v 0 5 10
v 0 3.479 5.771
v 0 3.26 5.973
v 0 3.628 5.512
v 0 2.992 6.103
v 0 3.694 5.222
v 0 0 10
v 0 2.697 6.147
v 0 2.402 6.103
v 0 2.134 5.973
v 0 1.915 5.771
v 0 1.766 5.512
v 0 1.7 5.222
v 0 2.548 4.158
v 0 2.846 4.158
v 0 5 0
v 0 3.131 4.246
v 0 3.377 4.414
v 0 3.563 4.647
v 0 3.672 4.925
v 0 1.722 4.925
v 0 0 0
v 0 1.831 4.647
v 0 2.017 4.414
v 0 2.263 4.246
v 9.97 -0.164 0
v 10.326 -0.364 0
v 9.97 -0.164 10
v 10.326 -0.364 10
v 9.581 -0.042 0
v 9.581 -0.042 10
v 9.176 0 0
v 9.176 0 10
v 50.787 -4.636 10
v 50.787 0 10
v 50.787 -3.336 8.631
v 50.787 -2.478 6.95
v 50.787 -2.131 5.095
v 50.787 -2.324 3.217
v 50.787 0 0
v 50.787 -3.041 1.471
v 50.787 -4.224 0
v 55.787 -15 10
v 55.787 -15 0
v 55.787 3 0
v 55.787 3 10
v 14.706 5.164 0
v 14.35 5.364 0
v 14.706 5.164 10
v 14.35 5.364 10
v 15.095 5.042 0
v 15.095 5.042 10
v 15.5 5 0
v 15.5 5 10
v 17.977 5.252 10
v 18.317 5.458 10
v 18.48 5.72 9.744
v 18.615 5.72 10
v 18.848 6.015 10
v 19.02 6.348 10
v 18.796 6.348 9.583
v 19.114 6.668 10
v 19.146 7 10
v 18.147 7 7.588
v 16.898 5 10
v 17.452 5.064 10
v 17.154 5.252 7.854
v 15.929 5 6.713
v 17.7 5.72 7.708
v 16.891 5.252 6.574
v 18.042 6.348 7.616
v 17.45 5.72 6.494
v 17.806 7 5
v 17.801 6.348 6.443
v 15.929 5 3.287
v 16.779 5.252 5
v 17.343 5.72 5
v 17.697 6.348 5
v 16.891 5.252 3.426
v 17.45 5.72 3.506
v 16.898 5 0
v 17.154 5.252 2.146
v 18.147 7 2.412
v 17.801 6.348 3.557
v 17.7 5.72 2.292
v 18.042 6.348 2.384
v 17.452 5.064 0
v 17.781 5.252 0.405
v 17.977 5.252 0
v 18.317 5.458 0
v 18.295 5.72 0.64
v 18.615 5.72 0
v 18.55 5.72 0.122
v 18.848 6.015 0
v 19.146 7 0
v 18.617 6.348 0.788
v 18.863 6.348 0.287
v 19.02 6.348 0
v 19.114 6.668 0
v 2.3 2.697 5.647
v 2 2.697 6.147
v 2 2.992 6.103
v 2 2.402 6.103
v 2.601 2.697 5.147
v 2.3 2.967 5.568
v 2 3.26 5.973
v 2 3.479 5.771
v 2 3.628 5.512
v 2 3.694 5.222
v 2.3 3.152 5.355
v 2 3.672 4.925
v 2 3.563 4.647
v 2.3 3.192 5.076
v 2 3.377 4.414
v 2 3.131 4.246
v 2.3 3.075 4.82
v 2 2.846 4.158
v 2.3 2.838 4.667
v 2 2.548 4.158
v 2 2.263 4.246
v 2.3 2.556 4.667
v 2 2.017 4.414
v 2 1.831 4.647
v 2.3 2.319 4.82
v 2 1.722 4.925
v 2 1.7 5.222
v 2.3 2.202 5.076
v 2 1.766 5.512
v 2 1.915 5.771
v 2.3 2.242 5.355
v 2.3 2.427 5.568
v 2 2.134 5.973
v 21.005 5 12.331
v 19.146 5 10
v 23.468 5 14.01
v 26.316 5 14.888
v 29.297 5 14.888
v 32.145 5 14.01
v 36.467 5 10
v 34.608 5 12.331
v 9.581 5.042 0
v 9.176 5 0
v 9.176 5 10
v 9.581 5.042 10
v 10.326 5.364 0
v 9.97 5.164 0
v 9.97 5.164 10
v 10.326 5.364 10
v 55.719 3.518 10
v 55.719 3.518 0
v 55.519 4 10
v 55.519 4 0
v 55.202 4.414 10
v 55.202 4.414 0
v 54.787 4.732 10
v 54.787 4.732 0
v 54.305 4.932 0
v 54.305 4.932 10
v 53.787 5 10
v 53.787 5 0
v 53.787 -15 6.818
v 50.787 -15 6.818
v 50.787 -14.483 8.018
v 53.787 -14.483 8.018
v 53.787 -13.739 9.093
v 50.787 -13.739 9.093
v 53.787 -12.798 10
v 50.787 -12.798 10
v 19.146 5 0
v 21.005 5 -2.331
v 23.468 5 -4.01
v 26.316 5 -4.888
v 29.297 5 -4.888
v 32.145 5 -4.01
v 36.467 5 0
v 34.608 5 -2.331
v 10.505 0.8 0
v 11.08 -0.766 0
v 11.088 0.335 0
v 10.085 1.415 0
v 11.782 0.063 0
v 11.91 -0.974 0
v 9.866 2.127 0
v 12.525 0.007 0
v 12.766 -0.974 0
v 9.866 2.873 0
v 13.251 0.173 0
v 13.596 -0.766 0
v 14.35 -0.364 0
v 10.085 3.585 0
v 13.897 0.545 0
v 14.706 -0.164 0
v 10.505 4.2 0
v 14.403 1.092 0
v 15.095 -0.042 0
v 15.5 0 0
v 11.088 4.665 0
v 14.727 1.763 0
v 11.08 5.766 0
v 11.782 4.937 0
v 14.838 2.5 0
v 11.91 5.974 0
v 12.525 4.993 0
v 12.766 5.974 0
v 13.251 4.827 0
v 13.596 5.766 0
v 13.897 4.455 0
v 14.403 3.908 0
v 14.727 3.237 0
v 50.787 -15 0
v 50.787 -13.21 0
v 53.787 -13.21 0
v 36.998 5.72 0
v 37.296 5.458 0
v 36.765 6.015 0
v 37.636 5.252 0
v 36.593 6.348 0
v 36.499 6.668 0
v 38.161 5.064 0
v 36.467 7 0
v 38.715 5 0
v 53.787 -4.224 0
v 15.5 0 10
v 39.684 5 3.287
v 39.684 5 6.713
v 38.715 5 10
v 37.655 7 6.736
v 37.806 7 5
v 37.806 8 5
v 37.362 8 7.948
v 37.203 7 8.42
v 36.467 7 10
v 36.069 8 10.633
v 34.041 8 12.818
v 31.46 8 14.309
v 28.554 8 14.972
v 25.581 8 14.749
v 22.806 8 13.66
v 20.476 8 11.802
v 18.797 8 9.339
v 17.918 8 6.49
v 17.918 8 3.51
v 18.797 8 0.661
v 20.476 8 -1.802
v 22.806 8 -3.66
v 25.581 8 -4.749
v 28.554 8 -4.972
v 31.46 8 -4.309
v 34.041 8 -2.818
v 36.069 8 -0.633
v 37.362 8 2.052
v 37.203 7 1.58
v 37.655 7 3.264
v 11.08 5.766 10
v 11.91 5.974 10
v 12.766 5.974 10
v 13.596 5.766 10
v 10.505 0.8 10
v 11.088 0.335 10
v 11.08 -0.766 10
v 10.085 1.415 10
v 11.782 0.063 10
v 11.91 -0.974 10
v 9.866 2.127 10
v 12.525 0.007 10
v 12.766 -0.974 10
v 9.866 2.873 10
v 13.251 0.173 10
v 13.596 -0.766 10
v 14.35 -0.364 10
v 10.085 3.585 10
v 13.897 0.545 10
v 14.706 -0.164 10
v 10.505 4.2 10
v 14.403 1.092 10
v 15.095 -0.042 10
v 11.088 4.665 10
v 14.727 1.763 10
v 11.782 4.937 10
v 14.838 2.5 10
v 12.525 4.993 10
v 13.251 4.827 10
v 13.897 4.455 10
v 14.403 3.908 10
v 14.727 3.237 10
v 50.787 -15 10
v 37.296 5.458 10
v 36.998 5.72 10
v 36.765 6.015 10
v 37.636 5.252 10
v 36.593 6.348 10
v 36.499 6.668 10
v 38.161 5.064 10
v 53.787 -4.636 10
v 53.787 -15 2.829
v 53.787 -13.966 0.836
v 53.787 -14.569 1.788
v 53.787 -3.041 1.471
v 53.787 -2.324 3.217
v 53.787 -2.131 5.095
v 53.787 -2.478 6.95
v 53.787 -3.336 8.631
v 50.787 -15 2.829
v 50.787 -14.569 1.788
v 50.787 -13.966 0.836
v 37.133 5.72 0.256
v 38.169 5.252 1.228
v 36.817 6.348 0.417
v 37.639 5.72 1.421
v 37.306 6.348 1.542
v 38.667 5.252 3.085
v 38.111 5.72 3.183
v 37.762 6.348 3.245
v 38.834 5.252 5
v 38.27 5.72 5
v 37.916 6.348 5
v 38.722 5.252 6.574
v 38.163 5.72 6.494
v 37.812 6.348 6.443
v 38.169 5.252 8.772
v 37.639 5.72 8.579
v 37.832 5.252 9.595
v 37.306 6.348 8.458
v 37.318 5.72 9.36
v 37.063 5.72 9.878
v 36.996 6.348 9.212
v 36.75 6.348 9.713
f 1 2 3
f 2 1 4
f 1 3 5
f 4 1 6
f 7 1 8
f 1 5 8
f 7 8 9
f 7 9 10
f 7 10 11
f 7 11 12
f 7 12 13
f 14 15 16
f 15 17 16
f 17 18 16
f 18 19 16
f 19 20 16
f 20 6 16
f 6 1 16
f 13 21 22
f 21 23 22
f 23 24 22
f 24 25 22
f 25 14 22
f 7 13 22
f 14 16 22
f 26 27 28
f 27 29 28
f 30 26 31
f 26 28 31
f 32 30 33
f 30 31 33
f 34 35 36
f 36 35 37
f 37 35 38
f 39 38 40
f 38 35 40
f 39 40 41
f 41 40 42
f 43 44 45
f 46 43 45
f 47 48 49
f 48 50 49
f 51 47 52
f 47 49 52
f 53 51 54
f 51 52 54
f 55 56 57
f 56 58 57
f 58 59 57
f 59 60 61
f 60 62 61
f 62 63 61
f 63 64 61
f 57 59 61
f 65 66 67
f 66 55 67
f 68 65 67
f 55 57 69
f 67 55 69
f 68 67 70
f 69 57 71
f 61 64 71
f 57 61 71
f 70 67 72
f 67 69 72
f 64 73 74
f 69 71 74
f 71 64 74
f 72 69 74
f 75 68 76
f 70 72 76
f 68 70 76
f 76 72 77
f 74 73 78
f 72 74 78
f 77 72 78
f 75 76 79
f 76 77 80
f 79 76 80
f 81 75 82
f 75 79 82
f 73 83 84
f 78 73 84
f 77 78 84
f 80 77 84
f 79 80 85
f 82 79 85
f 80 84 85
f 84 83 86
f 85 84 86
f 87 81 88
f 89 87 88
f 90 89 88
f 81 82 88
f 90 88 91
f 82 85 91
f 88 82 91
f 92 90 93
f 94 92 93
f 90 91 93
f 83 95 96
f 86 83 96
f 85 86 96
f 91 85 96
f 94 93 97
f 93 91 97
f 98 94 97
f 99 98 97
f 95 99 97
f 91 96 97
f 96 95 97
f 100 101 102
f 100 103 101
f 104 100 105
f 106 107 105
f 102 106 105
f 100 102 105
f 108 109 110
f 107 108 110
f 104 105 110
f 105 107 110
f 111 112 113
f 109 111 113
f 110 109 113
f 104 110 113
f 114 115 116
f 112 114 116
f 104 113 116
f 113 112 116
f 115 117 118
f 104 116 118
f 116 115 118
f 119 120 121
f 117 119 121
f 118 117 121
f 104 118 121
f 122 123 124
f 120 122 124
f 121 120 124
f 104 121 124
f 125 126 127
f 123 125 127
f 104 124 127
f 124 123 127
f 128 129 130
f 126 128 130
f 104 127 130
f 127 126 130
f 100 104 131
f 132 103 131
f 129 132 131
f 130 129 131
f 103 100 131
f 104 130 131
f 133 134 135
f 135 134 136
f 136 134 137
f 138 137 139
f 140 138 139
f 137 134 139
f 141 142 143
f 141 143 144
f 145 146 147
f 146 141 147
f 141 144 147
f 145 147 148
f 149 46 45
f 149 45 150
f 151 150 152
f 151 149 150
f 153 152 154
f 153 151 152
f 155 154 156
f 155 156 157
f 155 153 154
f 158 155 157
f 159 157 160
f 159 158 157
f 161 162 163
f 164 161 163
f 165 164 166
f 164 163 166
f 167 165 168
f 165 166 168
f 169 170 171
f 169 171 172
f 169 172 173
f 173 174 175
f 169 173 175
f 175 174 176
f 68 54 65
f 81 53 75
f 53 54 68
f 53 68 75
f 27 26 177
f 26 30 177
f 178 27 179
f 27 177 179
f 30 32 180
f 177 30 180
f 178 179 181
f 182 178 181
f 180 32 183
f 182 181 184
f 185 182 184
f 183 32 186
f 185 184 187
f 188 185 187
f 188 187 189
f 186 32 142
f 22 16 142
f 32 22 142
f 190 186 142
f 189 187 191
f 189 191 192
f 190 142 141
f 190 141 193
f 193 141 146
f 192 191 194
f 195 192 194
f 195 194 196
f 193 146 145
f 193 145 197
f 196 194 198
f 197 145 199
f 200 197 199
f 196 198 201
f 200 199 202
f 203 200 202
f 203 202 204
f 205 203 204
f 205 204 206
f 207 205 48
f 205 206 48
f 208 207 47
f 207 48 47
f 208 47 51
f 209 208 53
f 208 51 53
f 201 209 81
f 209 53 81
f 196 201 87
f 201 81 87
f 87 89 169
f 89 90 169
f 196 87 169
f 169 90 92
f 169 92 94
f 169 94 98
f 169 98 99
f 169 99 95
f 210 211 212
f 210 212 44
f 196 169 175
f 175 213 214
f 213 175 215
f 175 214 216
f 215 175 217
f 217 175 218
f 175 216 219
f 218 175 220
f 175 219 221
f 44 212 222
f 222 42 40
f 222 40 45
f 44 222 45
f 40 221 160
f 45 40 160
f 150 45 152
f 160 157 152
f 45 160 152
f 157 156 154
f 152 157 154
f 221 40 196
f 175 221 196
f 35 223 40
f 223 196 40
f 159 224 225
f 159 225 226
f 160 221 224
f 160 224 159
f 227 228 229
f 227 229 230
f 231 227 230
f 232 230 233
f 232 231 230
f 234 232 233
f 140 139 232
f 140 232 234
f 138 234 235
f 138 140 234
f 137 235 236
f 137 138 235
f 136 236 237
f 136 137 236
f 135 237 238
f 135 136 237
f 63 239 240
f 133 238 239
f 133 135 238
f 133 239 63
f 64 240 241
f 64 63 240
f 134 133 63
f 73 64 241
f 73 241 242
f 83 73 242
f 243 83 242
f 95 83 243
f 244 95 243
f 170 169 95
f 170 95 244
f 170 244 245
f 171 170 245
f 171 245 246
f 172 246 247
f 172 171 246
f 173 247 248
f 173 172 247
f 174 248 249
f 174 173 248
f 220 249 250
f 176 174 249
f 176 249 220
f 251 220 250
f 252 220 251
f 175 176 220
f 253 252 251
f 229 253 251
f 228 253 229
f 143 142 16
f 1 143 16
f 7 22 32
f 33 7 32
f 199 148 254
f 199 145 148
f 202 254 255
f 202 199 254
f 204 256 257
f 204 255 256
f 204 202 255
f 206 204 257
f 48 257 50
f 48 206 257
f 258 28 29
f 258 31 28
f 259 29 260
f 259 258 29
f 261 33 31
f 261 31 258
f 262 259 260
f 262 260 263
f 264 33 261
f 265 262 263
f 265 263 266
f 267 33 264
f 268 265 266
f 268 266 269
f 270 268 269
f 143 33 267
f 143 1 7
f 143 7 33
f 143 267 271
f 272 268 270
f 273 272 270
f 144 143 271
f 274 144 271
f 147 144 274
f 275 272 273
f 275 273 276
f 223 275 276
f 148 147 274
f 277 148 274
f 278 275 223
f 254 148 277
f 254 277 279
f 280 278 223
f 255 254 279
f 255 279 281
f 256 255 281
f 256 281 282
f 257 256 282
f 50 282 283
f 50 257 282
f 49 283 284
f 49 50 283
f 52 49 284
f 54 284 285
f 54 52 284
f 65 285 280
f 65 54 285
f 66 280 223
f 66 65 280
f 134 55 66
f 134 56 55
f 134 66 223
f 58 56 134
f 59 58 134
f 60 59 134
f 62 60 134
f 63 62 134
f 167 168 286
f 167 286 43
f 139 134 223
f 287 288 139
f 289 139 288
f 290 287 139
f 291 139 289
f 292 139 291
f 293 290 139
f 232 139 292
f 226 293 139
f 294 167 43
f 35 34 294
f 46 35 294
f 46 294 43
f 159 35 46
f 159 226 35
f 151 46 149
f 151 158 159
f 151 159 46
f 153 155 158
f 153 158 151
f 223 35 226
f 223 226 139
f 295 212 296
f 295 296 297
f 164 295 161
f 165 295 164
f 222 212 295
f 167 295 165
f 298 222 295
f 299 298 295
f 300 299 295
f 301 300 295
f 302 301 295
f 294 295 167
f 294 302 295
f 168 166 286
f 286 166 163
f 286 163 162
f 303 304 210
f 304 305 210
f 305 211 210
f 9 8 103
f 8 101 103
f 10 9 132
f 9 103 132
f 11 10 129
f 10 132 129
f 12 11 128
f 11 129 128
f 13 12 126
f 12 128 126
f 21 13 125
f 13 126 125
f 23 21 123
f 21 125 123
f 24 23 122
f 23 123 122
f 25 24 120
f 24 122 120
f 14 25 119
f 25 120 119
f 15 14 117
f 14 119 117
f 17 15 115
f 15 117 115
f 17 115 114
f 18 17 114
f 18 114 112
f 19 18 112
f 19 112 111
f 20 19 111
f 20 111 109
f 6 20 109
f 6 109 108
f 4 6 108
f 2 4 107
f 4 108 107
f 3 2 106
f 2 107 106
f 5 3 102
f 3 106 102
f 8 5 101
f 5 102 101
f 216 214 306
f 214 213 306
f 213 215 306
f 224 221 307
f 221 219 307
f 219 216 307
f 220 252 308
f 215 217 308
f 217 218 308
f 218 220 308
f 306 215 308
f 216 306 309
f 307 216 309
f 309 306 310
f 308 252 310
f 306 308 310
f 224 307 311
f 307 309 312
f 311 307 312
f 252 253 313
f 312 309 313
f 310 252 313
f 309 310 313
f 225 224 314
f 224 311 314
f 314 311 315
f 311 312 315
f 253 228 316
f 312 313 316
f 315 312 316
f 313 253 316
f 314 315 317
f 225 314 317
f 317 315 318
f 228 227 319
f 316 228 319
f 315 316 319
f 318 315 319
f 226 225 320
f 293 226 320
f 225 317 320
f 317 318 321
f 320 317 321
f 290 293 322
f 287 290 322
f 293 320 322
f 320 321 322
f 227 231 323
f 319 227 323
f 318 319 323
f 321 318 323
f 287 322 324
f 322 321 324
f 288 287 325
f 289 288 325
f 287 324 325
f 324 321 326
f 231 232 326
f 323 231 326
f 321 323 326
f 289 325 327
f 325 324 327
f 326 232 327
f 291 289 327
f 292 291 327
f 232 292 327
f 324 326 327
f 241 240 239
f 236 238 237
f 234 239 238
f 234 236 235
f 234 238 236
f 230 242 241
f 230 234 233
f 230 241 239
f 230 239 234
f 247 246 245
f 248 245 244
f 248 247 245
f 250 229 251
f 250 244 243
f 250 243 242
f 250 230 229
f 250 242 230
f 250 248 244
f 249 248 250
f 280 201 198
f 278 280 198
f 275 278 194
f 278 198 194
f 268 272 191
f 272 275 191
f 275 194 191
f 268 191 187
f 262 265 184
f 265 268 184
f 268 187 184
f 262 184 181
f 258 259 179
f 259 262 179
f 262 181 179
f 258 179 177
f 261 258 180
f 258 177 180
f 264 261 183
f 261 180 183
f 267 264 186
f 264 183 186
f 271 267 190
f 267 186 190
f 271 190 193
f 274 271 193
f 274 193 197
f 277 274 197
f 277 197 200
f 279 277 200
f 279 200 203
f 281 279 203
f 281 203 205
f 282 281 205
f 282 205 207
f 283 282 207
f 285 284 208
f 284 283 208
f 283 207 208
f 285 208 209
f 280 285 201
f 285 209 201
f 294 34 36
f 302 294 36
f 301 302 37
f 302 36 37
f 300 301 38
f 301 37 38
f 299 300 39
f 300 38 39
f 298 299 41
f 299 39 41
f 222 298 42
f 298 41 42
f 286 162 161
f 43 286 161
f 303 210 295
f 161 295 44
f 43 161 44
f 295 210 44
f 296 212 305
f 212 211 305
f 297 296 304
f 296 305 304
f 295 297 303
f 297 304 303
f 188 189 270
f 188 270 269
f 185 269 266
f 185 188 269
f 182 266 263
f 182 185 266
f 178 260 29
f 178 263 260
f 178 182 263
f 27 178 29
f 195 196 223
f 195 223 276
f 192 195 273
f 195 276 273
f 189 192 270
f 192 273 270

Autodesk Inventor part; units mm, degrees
ref_plane "YZ Plane" through (0, 0, 0) normal (1, 0, 0) x (0, 1, 0)
ref_plane "XZ Plane" through (0, 0, 0) normal (0, 1, 0) x (-1, 0, 0)
ref_plane "XY Plane" through (0, 0, 0) normal (0, 0, 1) x (1, 0, 0)
sketch "Sketch1" plane through (0, 0, 0) normal (0, 0, 1) x (1, 0, 0)
  line L0 (0, 0) -> (9.8884, 0)
  line L1 (9.8884, 5) -> (0, 5)
  line L2 (0, 5) -> (0, 0)
  circle A0 centre (12.3379, 2.5) radius 2.5
  line L3 (14.7874, 5) -> (19.5284, 5)
  arc A1 (14.7874, 5) -> (9.8884, 5) centre (12.3379, 2.5) ccw
  arc A2 (9.8884, 0) -> (14.7874, 0) centre (12.3379, 2.5) ccw
  line L4 (19.5284, 5) -> (55.7874, 5)
  line L5 (14.7874, 0) -> (50.7874, 0)
  line L6 (50.7874, 0) -> (50.7874, -15)
  line L7 (50.7874, -15) -> (55.7874, -15)
  line L8 (55.7874, -15) -> (55.7874, 5)
  dimension "d6" = 5
  dimension "d7" = 3.5
  dimension "d8" = 36
  dimension "d9" = 15
  dimension "d10" = 5
extrude "Extrusion1" add sketch "Sketch1" along normal blind 10
sketch "Sketch2" plane through (14.7874, 5, 0) normal (0, 1, 0) x (1, 0, 0)
  circle A0 centre (13.0191, -5) radius 10
  point P0 (-14.7874, 0)
  dimension "d16" = 20
extrude "Extrusion2" add sketch "Sketch2" along normal blind 3
fillet "Fillet1" radius 2 1 edges at (17.8065, 5, 5)
fillet "Fillet2" radius 2 1 edges at (37.4658, 5, 2.4118)
fillet "Fillet3" radius 2 1 edges at (55.7874, 5, 5)
sketch "Sketch3" plane through (50.7874, -15, 0) normal (-1, 0, 0) x (0, 0, 1)
  circle A0 centre (4.8232, 6.283) radius 6.592
  line L0 (0, 0) -> (10, 0) projected
  point P0 (0, 15)
extrude "Extrusion3" cut sketch "Sketch3" against normal blind 3
fillet "Fillet4" radius 2 1 edges at (14.7874, 5, 5)
fillet "Fillet5" radius 2 1 edges at (9.8884, 5, 5)
fillet "Fillet6" radius 2 1 edges at (14.7874, 0, 5)
fillet "Fillet7" radius 2 1 edges at (9.8884, 0, 5)
sketch "Sketch4" plane through (0, 0, 0) normal (-1, 0, 0) x (0, 0, 1)
  point P0 (0, 0)
  point P1 (5.1471, 2.6969)
hole "Hole1" at (0, 2.6969, 5.1471) direction (1, 0, 0) diameter 2 depth 2 tip angle 118
properties part number "Rocker1"
